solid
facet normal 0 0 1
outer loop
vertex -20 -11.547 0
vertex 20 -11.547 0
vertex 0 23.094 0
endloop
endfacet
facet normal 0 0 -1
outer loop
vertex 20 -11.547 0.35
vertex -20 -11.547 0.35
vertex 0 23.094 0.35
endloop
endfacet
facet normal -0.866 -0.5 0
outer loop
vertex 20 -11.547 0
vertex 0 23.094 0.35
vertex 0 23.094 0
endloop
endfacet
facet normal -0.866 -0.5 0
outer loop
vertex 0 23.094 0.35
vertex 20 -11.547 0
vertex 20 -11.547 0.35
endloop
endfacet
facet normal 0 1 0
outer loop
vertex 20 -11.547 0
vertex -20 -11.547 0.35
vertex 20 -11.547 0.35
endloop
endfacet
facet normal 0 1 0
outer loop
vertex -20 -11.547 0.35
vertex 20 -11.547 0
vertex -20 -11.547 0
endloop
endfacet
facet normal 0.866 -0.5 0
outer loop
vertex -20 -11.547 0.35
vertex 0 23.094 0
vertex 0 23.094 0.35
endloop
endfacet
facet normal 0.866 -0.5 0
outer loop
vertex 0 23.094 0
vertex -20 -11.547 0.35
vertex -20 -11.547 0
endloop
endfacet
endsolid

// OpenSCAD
// Polygonal Tiles v.01
// (C) @oblomobka - 2023.03
// GPL license

module RegularTiles (Polygon = 3, edge = 20, h = 1, Bevel = 1){
    

    }
    
module TriangleTile (edge = 40, h = 0.35, Bevel =1){
    
    a = (edge * 0.5) / cos (30);
    // Definition of points and faces
    Tpoints=[
        [ 0, a, 0], [ a * +cos(30), a * (-sin(30)), 0], [ a * -cos(30), a * (-sin(30)), 0],
        [ 0, a, h], [ a * +cos(30), a * (-sin(30)), h], [ a * -cos(30), a * (-sin(30)), h],
    ];
       
    Tfaces=[
        [ 0, 1, 2],
        [ 3, 5, 4],
        [ 0, 3, 4, 1],
        [ 1, 4, 5, 2],
        [ 2, 5, 3, 0]
    ];
    
    polyhedron(Tpoints,Tfaces);
}

TriangleTile(edge = 40, h = 0.35);
